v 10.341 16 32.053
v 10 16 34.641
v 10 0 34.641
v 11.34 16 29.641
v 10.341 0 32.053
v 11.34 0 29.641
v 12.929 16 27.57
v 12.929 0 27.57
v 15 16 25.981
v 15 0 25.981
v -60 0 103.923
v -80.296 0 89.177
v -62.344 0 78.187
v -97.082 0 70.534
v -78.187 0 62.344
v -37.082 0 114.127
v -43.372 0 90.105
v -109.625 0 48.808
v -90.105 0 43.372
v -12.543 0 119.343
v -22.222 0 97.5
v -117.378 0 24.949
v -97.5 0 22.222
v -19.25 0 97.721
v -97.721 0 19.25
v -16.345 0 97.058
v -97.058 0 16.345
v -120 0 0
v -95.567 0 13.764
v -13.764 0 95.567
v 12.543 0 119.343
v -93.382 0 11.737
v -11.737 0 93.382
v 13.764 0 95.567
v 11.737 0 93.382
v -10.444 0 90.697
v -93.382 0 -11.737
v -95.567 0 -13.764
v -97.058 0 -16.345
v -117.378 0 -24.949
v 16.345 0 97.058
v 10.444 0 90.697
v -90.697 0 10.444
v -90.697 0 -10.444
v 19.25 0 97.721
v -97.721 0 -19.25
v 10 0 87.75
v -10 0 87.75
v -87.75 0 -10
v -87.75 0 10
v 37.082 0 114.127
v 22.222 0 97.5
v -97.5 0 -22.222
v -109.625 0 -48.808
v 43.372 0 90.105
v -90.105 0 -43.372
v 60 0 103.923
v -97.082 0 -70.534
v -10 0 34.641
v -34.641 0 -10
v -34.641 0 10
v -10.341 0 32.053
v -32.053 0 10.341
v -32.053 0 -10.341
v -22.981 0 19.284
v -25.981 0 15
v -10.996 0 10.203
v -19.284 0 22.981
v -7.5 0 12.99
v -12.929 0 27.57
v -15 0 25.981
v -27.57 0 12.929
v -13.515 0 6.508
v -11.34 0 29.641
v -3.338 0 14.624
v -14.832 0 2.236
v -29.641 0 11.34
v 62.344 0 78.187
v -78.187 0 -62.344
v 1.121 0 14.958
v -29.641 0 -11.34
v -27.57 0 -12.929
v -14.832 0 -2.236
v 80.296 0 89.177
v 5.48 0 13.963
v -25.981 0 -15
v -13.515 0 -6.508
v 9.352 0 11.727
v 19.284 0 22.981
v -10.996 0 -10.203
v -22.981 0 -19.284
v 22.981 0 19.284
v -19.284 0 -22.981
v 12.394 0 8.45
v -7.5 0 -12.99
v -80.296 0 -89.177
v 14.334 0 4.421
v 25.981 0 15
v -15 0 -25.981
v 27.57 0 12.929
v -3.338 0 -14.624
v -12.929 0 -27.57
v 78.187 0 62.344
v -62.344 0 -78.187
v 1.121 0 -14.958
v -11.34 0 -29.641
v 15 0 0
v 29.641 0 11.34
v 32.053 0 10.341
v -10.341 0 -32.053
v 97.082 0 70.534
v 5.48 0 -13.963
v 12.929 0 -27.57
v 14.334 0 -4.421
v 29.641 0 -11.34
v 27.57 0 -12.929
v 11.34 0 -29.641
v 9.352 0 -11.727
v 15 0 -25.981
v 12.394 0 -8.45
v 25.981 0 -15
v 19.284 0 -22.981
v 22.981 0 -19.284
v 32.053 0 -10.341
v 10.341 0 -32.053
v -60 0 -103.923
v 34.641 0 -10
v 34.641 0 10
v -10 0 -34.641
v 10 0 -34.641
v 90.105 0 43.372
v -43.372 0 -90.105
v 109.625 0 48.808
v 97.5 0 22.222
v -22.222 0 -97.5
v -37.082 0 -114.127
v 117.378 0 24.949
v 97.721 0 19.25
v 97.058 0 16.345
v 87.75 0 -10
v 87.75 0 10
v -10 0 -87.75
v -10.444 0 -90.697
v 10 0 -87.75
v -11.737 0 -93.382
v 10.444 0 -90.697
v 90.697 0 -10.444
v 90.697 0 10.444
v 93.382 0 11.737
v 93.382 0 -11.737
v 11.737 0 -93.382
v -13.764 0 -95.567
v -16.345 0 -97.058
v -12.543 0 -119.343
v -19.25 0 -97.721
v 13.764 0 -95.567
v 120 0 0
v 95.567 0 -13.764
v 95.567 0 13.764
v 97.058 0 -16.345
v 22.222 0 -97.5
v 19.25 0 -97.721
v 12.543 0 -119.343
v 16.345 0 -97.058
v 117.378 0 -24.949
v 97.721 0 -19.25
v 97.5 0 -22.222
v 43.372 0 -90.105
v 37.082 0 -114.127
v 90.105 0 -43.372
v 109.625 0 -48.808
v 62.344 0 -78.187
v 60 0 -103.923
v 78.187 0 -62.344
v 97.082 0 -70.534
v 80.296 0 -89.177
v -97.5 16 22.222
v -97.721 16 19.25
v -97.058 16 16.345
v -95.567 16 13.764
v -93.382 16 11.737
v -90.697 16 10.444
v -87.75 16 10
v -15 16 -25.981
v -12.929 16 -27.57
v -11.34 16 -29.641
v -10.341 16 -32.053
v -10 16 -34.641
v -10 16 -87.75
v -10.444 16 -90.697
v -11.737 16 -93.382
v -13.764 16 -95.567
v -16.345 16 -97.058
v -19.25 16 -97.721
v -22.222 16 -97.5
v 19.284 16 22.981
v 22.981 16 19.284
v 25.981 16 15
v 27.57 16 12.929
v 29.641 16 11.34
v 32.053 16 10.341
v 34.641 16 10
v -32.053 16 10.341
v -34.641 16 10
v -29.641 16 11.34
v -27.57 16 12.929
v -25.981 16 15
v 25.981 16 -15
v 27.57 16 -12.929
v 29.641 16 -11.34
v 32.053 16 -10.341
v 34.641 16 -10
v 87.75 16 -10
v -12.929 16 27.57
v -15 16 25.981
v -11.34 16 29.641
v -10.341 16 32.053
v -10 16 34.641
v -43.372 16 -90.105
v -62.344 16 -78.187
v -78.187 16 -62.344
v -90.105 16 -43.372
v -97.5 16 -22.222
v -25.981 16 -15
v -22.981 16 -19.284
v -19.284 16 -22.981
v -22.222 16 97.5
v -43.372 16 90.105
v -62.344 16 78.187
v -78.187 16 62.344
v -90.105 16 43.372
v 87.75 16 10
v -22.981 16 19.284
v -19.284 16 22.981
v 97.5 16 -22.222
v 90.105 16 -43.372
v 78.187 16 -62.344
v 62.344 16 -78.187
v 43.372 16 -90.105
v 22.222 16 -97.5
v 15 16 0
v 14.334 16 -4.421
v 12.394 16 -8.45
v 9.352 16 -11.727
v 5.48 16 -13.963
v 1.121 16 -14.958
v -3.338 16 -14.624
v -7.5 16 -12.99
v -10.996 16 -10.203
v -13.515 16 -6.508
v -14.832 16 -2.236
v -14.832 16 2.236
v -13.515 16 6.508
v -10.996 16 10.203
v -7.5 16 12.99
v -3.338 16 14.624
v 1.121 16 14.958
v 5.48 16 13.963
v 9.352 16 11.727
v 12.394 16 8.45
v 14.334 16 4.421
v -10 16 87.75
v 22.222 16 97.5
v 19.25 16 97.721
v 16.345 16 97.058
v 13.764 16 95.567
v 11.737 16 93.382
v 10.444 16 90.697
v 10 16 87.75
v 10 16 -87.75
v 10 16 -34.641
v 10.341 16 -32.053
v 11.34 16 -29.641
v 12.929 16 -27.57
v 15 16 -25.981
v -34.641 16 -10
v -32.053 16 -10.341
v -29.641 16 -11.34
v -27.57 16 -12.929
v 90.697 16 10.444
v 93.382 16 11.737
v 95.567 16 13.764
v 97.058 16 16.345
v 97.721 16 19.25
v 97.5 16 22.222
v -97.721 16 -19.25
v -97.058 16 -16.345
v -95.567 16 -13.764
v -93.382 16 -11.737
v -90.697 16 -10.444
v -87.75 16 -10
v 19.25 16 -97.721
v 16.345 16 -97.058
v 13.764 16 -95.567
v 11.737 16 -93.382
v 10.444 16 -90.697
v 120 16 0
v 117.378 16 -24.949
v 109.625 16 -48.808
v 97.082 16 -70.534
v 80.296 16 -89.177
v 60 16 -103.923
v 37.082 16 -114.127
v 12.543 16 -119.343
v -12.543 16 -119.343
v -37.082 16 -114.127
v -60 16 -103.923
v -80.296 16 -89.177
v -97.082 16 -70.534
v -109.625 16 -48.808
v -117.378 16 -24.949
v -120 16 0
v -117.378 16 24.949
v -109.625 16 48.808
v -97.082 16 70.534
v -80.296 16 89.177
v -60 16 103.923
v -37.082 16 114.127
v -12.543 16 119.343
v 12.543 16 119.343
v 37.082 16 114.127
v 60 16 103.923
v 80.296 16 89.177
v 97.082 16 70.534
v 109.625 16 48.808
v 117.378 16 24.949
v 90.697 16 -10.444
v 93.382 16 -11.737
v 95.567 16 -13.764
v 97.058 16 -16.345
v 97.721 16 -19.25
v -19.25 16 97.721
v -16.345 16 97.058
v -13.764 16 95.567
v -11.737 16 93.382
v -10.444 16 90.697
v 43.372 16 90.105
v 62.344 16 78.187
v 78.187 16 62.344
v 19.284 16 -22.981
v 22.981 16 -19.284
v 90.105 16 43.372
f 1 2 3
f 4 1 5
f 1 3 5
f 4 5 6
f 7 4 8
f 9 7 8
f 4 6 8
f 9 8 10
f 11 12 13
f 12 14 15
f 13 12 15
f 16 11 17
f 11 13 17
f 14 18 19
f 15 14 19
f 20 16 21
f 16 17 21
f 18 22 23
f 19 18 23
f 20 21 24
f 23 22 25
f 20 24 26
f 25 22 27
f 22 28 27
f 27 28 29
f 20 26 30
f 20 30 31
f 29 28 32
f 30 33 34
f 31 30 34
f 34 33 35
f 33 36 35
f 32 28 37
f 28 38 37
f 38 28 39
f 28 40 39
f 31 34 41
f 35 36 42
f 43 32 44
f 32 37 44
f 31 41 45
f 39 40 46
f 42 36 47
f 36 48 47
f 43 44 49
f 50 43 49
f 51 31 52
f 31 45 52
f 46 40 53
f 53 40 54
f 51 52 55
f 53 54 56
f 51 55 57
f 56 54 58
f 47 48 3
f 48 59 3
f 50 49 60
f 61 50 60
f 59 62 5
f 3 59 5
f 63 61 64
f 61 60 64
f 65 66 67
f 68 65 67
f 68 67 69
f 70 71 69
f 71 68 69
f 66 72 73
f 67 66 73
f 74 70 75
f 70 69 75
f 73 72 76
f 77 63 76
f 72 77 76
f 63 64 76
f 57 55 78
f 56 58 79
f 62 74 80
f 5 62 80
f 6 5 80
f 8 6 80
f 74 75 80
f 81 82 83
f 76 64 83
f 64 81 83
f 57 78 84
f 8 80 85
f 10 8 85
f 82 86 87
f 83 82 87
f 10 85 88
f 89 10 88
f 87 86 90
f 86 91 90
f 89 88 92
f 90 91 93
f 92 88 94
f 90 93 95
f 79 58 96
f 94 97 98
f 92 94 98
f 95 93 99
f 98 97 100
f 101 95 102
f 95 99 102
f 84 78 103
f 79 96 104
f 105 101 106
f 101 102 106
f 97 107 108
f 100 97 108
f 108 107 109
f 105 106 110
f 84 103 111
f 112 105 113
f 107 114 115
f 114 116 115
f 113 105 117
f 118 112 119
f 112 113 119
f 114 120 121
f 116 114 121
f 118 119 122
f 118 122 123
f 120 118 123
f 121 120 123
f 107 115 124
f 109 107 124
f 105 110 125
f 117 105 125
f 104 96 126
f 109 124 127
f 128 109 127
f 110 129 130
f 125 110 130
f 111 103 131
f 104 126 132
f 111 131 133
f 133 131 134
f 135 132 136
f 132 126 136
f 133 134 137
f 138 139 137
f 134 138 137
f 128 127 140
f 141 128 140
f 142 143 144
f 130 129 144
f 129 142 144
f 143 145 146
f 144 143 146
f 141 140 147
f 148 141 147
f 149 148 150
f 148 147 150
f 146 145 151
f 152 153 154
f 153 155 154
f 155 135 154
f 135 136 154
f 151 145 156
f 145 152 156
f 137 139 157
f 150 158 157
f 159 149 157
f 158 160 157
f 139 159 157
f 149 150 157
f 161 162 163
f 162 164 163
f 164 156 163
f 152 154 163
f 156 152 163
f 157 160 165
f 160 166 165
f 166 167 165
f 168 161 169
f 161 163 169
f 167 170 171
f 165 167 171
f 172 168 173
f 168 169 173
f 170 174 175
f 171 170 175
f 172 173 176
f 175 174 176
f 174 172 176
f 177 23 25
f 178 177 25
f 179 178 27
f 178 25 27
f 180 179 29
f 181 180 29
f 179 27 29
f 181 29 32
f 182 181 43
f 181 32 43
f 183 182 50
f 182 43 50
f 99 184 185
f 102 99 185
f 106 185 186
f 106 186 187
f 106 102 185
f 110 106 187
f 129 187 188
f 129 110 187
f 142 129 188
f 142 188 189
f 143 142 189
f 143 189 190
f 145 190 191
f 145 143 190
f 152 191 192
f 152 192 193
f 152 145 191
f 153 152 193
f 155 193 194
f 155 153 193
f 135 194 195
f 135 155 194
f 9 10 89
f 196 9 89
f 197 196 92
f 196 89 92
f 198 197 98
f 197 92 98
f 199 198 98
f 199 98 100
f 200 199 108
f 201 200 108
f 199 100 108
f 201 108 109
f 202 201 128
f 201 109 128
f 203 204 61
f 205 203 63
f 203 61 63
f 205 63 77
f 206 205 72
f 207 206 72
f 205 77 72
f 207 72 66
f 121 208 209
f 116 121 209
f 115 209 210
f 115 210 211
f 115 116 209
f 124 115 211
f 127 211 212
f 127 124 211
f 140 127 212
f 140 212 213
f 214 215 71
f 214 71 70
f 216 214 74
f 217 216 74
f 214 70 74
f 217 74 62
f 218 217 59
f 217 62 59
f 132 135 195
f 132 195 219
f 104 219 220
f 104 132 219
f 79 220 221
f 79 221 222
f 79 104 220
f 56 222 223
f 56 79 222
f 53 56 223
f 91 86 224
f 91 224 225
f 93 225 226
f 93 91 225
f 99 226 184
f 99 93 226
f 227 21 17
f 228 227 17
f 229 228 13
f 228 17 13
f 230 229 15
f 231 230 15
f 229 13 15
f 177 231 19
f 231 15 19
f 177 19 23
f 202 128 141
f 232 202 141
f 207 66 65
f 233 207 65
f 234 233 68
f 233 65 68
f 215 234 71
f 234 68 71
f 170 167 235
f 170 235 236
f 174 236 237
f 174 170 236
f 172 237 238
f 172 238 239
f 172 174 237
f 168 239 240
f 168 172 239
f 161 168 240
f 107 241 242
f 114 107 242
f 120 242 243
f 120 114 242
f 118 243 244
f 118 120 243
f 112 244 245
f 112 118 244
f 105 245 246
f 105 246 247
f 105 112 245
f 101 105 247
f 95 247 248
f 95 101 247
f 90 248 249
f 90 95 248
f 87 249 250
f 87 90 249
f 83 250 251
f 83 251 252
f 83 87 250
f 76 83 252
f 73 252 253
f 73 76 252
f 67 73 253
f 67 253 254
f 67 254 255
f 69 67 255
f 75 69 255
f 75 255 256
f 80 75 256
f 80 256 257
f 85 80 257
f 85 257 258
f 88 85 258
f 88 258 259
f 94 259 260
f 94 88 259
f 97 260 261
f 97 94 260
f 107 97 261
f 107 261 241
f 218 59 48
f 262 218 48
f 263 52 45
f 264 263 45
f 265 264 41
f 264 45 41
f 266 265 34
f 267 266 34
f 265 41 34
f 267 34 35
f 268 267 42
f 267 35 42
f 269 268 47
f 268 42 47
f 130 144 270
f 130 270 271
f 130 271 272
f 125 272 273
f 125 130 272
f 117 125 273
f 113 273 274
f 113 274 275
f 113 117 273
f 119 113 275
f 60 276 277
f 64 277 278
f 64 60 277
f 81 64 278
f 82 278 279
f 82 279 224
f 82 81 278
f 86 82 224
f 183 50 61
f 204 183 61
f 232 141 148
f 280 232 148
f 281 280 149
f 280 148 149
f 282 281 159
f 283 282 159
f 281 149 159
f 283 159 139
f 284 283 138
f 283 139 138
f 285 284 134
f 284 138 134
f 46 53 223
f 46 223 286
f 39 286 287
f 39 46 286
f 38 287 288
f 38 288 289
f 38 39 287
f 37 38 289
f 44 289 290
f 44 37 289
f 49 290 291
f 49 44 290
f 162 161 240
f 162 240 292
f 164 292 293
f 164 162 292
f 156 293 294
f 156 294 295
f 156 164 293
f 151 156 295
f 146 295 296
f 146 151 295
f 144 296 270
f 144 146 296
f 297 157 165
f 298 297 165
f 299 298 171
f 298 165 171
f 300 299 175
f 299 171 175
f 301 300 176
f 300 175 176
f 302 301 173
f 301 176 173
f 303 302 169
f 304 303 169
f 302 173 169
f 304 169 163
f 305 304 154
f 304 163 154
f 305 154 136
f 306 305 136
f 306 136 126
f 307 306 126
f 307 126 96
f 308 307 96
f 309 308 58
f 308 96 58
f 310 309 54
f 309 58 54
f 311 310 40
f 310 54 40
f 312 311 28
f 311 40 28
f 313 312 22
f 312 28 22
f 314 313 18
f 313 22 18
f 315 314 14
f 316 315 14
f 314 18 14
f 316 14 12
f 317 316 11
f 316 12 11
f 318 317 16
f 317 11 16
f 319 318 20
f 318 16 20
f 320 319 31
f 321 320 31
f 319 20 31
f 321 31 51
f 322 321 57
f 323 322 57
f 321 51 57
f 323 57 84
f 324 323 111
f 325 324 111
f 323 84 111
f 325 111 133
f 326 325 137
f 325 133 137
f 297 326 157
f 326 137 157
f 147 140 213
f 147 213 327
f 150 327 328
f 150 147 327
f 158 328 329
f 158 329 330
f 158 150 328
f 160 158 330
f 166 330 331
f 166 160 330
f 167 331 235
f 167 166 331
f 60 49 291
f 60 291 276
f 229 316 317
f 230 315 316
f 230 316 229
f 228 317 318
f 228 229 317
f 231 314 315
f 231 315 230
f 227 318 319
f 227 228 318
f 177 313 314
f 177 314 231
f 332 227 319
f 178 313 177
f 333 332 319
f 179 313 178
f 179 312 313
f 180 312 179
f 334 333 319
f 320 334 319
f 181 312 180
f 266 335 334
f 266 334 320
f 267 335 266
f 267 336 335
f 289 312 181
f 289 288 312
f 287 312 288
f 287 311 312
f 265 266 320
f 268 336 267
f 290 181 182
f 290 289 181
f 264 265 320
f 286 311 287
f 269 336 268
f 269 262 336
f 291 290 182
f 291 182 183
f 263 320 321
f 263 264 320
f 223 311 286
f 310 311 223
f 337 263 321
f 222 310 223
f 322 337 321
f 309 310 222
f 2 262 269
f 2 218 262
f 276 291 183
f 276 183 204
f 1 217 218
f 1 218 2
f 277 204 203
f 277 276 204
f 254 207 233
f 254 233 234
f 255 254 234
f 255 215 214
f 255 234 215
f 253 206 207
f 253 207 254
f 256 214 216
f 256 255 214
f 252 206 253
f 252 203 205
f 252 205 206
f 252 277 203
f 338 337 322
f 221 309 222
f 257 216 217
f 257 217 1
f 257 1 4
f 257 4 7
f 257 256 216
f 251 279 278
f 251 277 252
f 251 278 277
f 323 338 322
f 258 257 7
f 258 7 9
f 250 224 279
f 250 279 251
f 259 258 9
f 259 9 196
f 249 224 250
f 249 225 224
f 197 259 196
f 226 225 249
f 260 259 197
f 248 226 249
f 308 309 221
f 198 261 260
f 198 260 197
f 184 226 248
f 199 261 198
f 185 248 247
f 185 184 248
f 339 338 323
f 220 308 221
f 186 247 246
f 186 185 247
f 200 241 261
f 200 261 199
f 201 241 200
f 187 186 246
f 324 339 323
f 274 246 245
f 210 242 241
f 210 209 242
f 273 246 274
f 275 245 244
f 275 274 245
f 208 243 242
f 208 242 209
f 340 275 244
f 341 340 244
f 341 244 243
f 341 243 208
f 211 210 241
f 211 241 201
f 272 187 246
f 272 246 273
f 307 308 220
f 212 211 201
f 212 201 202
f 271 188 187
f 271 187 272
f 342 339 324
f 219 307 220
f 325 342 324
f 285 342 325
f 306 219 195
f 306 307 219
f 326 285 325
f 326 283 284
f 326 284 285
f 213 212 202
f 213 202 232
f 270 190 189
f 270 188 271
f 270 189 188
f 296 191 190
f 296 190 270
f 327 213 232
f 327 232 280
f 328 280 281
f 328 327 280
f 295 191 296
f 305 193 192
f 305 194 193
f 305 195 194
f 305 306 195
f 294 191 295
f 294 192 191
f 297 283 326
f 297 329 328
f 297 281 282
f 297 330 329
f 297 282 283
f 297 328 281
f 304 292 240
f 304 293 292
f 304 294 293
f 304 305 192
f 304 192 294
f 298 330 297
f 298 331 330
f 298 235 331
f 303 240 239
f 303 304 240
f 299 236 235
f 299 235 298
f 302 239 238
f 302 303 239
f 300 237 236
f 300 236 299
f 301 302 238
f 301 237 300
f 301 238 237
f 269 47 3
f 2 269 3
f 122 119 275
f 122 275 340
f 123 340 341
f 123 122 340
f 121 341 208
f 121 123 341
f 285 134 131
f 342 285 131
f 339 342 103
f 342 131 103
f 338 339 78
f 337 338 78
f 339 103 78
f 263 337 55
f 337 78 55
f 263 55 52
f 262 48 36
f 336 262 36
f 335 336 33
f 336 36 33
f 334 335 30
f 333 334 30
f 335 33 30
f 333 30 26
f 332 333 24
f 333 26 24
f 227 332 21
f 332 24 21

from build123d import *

# Parameters (mm, degrees)
SKETCH1_R           = 120
SKETCH1_R_2         = 15
BOSS_EXTRUDE1_DEPTH = 16


with BuildPart() as part:
    # Sketch1 → Boss-Extrude1 (new body)
    with BuildSketch(Plane(origin=(0, 0, 0), x_dir=(1, 0, 0), z_dir=(0, 1, 0))):
        Circle(SKETCH1_R)
        Circle(SKETCH1_R_2, mode=Mode.SUBTRACT)
        with BuildLine():
            Line((34.641016151, 10), (87.749643874, 10))
            ThreePointArc((87.749643874, 10), (95.567003474, 13.763904355), (97.499604304, 22.222222222))
            ThreePointArc((97.499604304, 22.222222222), (70.710678119, 70.710678119), (22.222222222, 97.499604304))
            ThreePointArc((22.222222222, 97.499604304), (13.763904355, 95.567003474), (10, 87.749643874))
            Line((10, 87.749643874), (10, 34.641016151))
            ThreePointArc((10, 34.641016151), (11.339745962, 29.641016151), (15, 25.980762114))
            ThreePointArc((15, 25.980762114), (21.213203436, 21.213203436), (25.980762114, 15))
            ThreePointArc((25.980762114, 15), (29.641016151, 11.339745962), (34.641016151, 10))
        make_face(mode=Mode.SUBTRACT)
        with BuildLine():
            Line((-10, 34.641016151), (-10, 87.749643874))
            ThreePointArc((-10, 87.749643874), (-13.763904355, 95.567003474), (-22.222222222, 97.499604304))
            ThreePointArc((-22.222222222, 97.499604304), (-70.710678119, 70.710678119), (-97.499604304, 22.222222222))
            ThreePointArc((-97.499604304, 22.222222222), (-95.567003474, 13.763904355), (-87.749643874, 10))
            Line((-87.749643874, 10), (-34.641016151, 10))
            ThreePointArc((-34.641016151, 10), (-29.641016151, 11.339745962), (-25.980762114, 15))
            ThreePointArc((-25.980762114, 15), (-21.213203436, 21.213203436), (-15, 25.980762114))
            ThreePointArc((-15, 25.980762114), (-11.339745962, 29.641016151), (-10, 34.641016151))
        make_face(mode=Mode.SUBTRACT)
        with BuildLine():
            Line((34.641016151, -10), (87.749643874, -10))
            ThreePointArc((87.749643874, -10), (95.567003474, -13.763904355), (97.499604304, -22.222222222))
            ThreePointArc((97.499604304, -22.222222222), (70.710678119, -70.710678119), (22.222222222, -97.499604304))
            ThreePointArc((22.222222222, -97.499604304), (13.763904355, -95.567003474), (10, -87.749643874))
            Line((10, -87.749643874), (10, -34.641016151))
            ThreePointArc((10, -34.641016151), (11.339745962, -29.641016151), (15, -25.980762114))
            ThreePointArc((15, -25.980762114), (21.213203436, -21.213203436), (25.980762114, -15))
            ThreePointArc((25.980762114, -15), (29.641016151, -11.339745962), (34.641016151, -10))
        make_face(mode=Mode.SUBTRACT)
        with BuildLine():
            Line((-10, -34.641016151), (-10, -87.749643874))
            ThreePointArc((-10, -87.749643874), (-13.763904355, -95.567003474), (-22.222222222, -97.499604304))
            ThreePointArc((-22.222222222, -97.499604304), (-70.710678119, -70.710678119), (-97.499604304, -22.222222222))
            ThreePointArc((-97.499604304, -22.222222222), (-95.567003474, -13.763904355), (-87.749643874, -10))
            Line((-87.749643874, -10), (-34.641016151, -10))
            ThreePointArc((-34.641016151, -10), (-29.641016151, -11.339745962), (-25.980762114, -15))
            ThreePointArc((-25.980762114, -15), (-21.213203436, -21.213203436), (-15, -25.980762114))
            ThreePointArc((-15, -25.980762114), (-11.339745962, -29.641016151), (-10, -34.641016151))
        make_face(mode=Mode.SUBTRACT)
    extrude(amount=BOSS_EXTRUDE1_DEPTH)


solid = part.part
